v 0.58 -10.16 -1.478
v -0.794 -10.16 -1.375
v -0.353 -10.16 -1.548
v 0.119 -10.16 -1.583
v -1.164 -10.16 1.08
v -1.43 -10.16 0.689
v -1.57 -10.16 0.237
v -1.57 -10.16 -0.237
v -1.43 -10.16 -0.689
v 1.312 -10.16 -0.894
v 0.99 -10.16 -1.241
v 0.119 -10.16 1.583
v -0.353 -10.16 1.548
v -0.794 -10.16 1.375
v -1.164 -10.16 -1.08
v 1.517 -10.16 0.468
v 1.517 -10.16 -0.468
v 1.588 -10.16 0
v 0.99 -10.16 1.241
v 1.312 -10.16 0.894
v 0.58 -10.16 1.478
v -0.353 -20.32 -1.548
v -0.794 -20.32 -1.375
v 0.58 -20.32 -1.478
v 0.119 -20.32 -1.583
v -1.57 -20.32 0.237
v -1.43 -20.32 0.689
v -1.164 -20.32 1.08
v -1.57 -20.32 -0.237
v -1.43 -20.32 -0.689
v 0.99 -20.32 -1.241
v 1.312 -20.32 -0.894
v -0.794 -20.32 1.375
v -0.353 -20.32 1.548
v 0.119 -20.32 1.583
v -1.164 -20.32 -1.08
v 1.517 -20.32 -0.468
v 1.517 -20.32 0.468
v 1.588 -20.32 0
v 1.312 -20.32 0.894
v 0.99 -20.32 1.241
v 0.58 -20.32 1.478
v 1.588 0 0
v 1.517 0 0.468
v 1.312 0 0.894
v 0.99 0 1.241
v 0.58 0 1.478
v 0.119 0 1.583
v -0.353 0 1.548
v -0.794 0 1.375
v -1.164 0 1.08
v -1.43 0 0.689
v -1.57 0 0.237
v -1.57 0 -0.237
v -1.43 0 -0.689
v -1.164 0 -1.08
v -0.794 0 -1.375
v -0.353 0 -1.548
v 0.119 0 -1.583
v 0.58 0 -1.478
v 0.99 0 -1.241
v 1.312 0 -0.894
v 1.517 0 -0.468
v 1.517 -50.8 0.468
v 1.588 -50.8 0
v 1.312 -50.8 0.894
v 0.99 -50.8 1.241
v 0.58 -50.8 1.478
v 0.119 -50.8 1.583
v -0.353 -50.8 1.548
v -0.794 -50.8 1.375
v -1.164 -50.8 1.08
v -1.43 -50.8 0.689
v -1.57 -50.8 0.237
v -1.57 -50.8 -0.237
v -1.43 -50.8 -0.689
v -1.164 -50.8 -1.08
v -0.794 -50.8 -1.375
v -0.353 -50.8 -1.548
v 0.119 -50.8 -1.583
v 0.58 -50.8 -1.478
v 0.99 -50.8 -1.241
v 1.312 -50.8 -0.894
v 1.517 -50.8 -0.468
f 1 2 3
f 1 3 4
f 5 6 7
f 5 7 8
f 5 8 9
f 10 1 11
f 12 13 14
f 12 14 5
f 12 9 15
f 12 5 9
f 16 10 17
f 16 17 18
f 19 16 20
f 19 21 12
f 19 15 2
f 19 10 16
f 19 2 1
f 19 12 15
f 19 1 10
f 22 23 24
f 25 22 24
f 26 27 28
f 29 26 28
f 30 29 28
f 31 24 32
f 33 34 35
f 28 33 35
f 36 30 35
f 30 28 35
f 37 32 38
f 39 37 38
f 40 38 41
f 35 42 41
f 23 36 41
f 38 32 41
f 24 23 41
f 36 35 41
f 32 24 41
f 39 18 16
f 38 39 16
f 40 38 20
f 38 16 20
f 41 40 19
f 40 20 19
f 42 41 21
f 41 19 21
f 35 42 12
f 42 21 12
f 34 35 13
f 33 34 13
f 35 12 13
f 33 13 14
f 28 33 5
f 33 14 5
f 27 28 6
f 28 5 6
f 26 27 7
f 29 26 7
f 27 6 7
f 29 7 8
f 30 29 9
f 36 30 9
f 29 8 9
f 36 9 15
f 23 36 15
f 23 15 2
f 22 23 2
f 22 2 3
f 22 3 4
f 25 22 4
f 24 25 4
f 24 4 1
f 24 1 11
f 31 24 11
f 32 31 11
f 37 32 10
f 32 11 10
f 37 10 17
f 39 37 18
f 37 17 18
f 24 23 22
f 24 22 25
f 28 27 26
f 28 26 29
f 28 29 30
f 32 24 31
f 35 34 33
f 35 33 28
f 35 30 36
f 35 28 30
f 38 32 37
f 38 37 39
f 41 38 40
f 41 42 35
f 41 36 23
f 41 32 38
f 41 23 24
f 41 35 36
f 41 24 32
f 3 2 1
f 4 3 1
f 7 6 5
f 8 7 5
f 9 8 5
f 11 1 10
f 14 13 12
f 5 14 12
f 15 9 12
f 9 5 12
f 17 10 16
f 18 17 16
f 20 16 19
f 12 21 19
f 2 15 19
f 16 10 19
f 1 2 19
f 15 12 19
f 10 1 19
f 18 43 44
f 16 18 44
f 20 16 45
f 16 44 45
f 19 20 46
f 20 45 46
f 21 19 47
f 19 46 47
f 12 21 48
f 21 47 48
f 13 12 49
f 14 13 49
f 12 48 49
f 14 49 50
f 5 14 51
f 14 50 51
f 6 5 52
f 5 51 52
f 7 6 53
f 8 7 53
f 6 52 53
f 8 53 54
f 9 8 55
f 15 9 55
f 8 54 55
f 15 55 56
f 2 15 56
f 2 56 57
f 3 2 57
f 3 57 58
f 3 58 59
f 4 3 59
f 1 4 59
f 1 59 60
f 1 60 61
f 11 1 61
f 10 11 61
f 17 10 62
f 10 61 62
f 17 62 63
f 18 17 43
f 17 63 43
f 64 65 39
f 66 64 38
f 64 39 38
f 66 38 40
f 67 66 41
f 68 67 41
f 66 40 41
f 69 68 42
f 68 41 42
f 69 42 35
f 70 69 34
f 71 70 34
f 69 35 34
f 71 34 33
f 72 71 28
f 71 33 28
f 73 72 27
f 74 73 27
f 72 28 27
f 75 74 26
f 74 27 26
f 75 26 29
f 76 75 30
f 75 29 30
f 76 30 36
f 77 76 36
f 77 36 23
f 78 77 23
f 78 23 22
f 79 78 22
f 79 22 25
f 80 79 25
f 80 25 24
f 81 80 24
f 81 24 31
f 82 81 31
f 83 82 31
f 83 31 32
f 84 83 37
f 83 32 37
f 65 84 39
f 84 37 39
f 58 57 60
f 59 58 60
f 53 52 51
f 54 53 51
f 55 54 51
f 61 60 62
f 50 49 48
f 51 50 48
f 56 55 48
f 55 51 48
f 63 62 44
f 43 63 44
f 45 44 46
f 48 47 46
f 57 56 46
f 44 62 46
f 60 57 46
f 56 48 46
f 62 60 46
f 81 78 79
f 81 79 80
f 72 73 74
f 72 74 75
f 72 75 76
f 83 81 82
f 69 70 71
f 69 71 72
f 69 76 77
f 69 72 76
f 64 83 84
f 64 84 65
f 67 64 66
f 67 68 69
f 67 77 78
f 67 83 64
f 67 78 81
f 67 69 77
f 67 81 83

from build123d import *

# Parameters (mm, degrees)
F0_R      = 1.5875
F1_DEPTH  = 10.16
F1_FACE_R = 1.5875
F2_DEPTH  = 10.16
F3_R      = 1.5875
F4_DEPTH  = 30.48


with BuildPart() as f1:
    # F0 (on Front) → F1 (new body)
    with BuildSketch(Plane.XZ):
        Circle(F0_R)
    extrude(amount=F1_DEPTH)


with BuildPart() as f2:
    # F1_face (on face) → F2 (new body)
    with BuildSketch(Plane.XZ.offset(10.16)):
        Circle(F1_FACE_R)
    extrude(amount=F2_DEPTH)


with BuildPart() as f4:
    # F3 (on face) → F4 (new body)
    with BuildSketch(Plane.XZ.offset(20.32)):
        Circle(F3_R)
    extrude(amount=F4_DEPTH)


solid = Compound([f1.part, f2.part, f4.part])
